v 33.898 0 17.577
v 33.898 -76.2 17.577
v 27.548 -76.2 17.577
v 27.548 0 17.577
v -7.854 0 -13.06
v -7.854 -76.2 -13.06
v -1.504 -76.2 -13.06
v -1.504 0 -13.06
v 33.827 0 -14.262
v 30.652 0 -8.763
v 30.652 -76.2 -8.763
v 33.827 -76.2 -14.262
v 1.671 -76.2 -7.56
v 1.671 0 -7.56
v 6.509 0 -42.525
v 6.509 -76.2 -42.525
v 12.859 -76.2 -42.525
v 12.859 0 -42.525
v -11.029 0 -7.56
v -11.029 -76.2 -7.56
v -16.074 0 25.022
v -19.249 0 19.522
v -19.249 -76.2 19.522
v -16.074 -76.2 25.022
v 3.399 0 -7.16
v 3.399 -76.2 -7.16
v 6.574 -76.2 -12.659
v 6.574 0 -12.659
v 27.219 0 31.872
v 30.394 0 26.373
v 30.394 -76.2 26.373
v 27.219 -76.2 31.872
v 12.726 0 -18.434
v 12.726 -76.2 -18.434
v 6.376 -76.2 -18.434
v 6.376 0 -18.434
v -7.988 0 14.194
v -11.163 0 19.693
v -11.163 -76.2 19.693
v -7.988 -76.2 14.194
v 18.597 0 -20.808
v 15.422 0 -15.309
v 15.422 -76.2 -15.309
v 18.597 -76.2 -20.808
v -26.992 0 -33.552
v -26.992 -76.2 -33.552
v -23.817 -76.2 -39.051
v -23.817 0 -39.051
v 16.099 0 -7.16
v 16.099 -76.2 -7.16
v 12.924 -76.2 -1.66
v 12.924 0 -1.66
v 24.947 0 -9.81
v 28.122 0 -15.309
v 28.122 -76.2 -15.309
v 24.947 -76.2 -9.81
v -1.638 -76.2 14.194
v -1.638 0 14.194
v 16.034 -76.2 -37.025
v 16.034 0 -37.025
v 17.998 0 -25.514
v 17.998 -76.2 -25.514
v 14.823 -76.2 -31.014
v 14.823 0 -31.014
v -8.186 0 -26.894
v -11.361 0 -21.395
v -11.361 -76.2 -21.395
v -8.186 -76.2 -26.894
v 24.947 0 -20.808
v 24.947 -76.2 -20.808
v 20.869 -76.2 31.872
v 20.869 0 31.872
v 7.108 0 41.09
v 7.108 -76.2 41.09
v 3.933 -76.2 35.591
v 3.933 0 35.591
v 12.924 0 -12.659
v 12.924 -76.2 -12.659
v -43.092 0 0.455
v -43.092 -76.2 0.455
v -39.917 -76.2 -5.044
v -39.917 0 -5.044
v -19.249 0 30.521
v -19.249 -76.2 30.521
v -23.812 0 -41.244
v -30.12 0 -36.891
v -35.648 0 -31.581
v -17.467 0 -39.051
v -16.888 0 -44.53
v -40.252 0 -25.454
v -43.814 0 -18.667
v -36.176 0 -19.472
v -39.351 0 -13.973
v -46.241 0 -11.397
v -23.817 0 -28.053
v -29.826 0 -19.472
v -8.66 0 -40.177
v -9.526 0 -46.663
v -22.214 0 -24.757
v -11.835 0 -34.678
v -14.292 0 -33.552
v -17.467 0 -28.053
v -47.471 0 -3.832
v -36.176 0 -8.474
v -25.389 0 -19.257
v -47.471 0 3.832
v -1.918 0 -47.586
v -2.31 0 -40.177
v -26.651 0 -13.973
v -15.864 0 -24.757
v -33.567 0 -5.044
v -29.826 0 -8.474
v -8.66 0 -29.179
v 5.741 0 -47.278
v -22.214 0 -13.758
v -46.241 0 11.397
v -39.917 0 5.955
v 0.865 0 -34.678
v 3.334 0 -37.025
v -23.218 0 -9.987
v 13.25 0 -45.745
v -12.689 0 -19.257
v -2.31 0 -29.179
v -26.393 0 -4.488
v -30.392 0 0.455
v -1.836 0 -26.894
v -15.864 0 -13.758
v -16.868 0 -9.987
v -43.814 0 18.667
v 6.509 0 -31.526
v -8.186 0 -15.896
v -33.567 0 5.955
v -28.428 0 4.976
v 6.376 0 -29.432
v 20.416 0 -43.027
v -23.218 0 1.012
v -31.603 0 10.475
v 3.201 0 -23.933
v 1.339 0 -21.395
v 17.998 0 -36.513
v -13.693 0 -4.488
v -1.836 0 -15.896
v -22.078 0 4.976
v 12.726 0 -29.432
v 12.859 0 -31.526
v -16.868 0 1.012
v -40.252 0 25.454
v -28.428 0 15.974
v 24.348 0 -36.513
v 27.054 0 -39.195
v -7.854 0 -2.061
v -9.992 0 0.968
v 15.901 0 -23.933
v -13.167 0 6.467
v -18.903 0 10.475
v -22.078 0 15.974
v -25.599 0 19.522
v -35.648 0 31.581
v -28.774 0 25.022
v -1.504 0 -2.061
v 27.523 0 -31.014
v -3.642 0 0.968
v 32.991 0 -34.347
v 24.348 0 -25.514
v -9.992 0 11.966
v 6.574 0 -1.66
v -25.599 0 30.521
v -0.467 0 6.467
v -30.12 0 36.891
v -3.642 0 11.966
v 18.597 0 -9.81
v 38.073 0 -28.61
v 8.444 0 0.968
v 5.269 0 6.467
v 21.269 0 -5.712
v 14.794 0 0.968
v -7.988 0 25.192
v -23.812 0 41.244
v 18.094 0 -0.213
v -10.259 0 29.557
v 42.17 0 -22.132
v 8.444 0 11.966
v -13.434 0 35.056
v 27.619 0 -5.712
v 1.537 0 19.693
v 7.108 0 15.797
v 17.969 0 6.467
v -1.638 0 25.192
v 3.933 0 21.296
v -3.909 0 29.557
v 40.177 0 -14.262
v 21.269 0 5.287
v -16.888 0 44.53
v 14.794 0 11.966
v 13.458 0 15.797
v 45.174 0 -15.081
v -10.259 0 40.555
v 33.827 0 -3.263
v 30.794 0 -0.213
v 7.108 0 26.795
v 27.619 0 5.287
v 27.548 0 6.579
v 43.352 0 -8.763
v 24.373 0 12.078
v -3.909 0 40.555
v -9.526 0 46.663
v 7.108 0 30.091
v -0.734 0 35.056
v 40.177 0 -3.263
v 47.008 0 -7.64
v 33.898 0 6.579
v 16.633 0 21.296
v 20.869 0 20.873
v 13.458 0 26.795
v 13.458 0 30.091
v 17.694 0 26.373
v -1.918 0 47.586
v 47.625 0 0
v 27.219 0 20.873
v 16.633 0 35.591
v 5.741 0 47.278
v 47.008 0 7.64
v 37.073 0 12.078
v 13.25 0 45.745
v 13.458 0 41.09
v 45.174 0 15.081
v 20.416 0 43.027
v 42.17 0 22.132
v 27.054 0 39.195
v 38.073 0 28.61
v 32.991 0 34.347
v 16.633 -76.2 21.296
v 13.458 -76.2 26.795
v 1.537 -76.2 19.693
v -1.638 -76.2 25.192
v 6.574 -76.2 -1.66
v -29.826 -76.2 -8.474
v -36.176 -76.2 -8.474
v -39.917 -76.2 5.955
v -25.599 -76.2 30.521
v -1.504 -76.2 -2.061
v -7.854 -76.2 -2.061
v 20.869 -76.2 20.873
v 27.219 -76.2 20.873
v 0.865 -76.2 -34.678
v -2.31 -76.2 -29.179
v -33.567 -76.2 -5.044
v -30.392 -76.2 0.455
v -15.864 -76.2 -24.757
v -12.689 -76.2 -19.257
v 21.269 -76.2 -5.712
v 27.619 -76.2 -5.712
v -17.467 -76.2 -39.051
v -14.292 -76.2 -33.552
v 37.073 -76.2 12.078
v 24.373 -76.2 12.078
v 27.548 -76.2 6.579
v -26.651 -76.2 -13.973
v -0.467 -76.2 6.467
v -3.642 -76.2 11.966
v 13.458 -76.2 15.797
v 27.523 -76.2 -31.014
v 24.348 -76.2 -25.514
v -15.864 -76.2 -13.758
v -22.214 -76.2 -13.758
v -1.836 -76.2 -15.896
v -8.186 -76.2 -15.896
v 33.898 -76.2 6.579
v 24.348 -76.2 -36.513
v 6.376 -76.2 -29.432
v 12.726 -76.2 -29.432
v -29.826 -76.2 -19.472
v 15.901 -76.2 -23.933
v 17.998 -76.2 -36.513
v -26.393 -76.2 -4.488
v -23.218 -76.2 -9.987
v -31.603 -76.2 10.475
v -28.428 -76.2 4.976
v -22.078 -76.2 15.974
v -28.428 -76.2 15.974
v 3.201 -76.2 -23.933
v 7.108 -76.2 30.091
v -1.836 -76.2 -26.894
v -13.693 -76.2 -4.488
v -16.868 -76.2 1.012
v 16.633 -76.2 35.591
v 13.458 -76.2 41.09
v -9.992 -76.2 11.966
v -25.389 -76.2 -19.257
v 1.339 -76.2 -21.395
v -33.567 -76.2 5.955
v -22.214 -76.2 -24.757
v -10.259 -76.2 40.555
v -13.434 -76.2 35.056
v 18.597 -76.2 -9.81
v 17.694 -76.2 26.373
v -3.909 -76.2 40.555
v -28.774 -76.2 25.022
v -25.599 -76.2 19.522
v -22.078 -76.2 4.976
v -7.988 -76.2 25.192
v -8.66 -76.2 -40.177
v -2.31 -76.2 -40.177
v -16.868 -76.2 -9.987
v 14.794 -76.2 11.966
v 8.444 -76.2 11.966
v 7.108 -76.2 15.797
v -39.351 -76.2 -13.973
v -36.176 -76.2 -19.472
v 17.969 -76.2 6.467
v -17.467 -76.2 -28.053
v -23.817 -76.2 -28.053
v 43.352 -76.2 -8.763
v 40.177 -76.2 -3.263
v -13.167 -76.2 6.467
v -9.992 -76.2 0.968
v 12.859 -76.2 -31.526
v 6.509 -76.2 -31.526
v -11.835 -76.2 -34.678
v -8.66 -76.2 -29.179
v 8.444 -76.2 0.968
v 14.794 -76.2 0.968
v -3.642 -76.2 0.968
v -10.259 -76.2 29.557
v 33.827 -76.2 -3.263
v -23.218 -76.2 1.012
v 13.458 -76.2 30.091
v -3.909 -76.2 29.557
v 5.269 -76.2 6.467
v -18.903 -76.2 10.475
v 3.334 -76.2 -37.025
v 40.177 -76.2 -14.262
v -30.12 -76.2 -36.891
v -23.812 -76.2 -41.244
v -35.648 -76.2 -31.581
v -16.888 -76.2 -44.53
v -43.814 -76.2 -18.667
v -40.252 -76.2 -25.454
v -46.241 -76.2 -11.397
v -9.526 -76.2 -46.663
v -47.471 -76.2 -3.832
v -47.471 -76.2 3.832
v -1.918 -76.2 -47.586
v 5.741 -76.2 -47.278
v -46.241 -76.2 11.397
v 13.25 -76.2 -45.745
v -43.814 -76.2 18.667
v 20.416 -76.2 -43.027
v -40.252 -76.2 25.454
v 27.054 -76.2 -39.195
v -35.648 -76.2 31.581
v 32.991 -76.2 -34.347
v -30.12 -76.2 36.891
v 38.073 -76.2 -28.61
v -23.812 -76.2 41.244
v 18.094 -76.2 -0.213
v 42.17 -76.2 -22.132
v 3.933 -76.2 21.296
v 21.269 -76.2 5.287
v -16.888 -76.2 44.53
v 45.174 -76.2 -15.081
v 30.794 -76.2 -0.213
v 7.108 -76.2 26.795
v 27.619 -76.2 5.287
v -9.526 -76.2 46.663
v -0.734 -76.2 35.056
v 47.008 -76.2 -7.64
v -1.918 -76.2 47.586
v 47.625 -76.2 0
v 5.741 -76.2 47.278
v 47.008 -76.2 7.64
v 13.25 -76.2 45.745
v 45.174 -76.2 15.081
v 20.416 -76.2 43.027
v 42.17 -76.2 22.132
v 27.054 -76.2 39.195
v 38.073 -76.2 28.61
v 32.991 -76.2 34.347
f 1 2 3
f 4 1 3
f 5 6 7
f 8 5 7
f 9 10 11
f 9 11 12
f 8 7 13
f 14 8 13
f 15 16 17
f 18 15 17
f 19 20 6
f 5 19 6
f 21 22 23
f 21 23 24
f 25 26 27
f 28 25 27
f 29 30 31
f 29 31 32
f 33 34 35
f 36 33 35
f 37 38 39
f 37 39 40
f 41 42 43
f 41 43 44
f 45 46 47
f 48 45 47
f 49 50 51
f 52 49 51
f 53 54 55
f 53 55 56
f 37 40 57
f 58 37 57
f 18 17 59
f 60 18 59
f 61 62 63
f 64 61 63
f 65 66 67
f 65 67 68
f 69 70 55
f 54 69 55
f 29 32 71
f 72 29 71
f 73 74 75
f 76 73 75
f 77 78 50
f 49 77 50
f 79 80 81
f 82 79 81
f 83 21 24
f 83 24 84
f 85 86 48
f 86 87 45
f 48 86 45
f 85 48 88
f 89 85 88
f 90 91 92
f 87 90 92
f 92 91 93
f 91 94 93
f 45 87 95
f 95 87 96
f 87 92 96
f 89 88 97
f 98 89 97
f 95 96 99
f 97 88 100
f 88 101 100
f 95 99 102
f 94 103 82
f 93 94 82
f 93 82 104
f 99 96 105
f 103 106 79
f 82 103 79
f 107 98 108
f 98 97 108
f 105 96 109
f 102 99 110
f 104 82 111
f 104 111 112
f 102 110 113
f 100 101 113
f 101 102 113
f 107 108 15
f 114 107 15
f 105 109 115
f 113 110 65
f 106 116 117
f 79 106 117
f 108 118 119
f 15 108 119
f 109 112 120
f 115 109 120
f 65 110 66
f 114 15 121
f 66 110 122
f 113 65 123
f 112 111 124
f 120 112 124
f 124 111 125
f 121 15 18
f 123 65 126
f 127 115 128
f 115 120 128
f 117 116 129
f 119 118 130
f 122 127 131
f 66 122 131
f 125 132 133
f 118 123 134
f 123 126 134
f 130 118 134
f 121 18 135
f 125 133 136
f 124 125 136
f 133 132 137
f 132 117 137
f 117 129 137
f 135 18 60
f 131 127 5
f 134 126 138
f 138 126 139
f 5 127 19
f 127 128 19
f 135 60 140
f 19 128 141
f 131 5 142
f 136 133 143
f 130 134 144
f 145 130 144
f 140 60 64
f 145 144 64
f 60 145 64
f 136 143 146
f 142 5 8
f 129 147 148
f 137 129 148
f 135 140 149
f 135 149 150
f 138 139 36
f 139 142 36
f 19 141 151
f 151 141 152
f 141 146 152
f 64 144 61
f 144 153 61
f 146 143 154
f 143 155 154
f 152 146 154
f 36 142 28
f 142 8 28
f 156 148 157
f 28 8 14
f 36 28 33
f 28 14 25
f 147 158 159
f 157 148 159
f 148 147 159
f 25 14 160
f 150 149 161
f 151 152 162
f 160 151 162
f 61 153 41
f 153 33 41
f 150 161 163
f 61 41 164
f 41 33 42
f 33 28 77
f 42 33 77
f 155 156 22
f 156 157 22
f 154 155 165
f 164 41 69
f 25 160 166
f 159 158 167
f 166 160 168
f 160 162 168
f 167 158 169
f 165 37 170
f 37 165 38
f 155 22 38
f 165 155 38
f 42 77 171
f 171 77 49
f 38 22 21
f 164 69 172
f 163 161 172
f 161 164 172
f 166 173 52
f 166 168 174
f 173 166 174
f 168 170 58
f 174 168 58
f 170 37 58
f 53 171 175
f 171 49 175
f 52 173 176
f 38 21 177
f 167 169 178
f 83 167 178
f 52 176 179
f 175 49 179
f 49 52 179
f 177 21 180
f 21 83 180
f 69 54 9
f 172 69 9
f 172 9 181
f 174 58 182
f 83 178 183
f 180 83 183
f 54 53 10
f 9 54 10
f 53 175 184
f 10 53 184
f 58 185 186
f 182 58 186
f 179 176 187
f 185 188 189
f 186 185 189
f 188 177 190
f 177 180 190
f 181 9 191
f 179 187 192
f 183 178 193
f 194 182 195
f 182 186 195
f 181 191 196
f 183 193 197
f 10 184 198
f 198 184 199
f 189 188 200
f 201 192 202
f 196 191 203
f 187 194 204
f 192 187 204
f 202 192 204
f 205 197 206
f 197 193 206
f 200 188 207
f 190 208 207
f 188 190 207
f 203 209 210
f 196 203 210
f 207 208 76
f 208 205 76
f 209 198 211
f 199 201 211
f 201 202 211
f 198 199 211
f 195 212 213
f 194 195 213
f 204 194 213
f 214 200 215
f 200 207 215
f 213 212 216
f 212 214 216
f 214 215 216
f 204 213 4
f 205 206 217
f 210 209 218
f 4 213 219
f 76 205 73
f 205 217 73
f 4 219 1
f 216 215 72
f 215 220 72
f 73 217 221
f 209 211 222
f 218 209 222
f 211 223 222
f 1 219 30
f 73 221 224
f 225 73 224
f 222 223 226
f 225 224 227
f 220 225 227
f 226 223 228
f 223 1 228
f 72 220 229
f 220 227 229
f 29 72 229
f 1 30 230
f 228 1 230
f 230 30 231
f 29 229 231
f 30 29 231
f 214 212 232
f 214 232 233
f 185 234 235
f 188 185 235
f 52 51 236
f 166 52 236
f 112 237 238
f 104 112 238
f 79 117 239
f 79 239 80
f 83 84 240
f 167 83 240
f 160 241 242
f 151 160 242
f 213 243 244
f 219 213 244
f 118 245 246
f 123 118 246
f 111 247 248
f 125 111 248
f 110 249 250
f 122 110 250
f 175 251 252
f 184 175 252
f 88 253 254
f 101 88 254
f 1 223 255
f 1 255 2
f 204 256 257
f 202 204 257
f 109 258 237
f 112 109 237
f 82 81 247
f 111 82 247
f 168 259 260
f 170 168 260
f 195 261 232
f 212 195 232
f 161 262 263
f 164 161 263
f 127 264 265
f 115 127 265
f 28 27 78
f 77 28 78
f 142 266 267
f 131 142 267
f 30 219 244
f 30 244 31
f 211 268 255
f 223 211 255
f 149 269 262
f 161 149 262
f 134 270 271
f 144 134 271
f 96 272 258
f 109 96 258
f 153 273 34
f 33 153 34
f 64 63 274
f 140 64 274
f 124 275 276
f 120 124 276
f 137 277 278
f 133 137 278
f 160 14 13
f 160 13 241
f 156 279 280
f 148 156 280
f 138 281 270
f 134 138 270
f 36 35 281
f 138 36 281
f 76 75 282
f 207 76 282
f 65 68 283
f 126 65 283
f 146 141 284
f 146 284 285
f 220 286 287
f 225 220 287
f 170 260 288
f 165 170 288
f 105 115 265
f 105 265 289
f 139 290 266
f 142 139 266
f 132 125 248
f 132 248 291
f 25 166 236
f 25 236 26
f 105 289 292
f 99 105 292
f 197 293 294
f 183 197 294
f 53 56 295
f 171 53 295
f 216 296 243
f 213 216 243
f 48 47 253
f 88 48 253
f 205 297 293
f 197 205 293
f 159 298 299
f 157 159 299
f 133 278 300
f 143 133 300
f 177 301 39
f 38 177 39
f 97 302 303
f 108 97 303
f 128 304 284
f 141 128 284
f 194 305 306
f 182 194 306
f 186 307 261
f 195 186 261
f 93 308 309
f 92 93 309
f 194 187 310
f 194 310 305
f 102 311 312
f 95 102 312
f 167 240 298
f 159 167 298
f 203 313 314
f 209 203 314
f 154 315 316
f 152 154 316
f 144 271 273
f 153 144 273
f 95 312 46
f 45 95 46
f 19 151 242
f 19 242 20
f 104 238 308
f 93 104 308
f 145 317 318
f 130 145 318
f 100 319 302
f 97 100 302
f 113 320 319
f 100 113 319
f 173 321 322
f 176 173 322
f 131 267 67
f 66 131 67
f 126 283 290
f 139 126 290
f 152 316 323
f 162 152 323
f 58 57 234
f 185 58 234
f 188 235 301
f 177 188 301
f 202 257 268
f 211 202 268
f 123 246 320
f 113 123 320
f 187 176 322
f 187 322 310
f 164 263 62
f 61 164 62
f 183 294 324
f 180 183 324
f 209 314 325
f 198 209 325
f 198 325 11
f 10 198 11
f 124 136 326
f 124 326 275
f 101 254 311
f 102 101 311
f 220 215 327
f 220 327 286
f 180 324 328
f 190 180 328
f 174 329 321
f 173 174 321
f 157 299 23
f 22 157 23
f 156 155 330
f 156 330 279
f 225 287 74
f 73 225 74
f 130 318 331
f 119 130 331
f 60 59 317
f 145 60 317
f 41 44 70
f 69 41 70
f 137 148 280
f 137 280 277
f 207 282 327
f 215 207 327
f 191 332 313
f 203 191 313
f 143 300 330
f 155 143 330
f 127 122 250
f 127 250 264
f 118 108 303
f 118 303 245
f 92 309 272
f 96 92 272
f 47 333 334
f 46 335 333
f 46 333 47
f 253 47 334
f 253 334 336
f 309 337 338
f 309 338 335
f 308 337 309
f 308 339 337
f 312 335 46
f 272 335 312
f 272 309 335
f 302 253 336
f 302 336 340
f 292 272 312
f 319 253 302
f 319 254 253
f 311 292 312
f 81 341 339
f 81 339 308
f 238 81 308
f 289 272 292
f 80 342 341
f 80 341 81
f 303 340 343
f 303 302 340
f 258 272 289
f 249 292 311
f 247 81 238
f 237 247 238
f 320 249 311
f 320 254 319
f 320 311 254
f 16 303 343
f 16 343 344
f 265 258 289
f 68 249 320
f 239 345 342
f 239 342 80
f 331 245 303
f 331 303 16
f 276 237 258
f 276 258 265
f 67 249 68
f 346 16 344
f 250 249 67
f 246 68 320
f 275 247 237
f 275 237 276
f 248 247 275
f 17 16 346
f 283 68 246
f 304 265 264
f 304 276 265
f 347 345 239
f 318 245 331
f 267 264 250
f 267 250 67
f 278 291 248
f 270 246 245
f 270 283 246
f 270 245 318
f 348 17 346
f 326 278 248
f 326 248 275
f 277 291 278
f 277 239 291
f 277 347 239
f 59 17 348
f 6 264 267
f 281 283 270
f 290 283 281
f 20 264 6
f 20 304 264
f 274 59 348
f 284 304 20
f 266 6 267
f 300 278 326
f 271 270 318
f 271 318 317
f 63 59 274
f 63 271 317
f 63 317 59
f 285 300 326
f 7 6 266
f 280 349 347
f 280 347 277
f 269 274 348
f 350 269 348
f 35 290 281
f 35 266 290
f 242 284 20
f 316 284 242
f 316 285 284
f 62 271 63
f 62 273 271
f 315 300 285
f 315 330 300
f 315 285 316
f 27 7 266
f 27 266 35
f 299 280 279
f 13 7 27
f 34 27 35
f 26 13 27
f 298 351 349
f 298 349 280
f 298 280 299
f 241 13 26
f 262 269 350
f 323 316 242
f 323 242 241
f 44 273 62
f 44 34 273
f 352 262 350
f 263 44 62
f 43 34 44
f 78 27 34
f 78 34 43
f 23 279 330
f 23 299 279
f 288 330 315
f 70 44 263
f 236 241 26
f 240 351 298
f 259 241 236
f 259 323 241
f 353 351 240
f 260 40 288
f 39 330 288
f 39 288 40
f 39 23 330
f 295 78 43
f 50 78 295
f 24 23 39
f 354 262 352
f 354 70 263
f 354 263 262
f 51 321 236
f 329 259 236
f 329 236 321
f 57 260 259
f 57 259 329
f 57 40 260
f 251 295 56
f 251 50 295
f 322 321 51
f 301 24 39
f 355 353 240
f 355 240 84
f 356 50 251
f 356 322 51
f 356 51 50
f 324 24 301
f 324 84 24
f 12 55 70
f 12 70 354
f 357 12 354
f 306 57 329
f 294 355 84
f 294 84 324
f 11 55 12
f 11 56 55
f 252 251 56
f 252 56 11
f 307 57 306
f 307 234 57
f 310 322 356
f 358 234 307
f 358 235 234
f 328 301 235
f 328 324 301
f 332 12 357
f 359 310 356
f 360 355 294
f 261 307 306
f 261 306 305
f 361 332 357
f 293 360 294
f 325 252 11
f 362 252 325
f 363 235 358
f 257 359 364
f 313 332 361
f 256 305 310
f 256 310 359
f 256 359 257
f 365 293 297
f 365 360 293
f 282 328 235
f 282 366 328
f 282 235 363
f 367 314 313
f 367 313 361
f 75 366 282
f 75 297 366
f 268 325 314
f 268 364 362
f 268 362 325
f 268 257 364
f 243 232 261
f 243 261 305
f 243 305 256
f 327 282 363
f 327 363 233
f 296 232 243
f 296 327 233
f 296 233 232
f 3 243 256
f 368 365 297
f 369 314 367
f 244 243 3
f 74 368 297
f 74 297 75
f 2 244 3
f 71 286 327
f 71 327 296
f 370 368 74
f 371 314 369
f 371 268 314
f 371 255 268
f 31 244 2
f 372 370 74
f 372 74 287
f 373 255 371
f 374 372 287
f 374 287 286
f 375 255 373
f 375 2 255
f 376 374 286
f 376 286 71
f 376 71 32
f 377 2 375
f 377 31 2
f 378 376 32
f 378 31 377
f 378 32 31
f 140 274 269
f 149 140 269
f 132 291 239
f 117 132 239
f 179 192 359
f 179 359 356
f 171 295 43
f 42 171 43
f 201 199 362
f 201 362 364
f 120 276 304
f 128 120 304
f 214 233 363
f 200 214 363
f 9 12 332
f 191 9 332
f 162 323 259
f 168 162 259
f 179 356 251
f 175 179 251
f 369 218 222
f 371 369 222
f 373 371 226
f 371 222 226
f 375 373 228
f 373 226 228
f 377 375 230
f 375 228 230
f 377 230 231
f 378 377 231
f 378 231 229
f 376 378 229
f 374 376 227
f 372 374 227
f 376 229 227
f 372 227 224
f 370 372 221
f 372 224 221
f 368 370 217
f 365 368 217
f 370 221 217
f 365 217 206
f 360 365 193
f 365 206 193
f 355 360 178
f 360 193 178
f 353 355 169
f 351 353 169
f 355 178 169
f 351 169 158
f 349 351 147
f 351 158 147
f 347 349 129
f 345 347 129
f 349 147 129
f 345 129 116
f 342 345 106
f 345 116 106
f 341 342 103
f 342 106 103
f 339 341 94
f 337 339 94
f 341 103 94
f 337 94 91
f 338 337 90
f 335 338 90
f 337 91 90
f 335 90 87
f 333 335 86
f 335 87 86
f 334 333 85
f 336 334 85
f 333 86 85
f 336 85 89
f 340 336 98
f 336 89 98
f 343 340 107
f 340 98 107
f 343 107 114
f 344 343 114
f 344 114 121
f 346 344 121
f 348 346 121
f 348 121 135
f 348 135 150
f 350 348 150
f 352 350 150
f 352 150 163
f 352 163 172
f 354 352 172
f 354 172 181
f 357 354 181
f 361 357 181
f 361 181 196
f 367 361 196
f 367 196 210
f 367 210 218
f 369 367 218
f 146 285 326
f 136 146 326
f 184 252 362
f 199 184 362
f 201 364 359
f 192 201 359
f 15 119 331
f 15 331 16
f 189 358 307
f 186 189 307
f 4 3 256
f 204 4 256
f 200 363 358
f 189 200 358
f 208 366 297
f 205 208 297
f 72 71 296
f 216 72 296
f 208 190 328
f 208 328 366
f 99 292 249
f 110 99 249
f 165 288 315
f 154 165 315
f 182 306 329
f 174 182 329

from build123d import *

# Parameters (mm, degrees)
F0_R     = 47.625
F1_DEPTH = 76.2
F3_DEPTH = 76.201


with BuildPart() as f1:
    # F0 (on Front) → F1 (new body)
    with BuildSketch(Plane.XZ):
        Circle(F0_R)
    extrude(amount=F1_DEPTH)

    # F2 (on face) → F3 (cut, through all)
    with BuildSketch(Plane.XZ.offset(76.2)):
        Polygon((-16.073533, 25.021508), (-19.248533, 30.52077), (-25.598533, 30.52077), (-28.773533, 25.021508), (-25.598533, 19.522247), (-19.248533, 19.522247), align=None)
        Polygon((-0.733869, 35.056195), (-3.908869, 40.555456), (-10.258869, 40.555456), (-13.433869, 35.056195), (-10.258869, 29.556934), (-3.908869, 29.556934), align=None)
        Polygon((16.633373, 35.590573), (13.458373, 41.089834), (7.108373, 41.089834), (3.933373, 35.590573), (7.108373, 30.091312), (13.458373, 30.091312), align=None)
        Polygon((1.537231, 19.692863), (-1.637769, 25.192124), (-7.987769, 25.192124), (-11.162769, 19.692863), (-7.987769, 14.193602), (-1.637769, 14.193602), align=None)
        Polygon((16.633373, 21.295993), (13.458373, 26.795255), (7.108373, 26.795255), (3.933373, 21.295993), (7.108373, 15.796732), (13.458373, 15.796732), align=None)
        Polygon((30.393575, 26.372573), (27.218575, 31.871834), (20.868575, 31.871834), (17.693575, 26.372573), (20.868575, 20.873312), (27.218575, 20.873312), align=None)
        Polygon((37.073285, 12.077994), (33.898285, 17.577256), (27.548285, 17.577256), (24.373285, 12.077994), (27.548285, 6.578733), (33.898285, 6.578733), align=None)
        Polygon((17.969316, 6.467039), (14.794316, 11.9663), (8.444316, 11.9663), (5.269316, 6.467039), (8.444316, 0.967778), (14.794316, 0.967778), align=None)
        Polygon((-0.466681, 6.467039), (-3.641681, 11.9663), (-9.991681, 11.9663), (-13.166681, 6.467039), (-9.991681, 0.967778), (-3.641681, 0.967778), align=None)
        Polygon((-18.902677, 10.474864), (-22.077677, 15.974126), (-28.427677, 15.974126), (-31.602677, 10.474864), (-28.427677, 4.975603), (-22.077677, 4.975603), align=None)
        Polygon((-30.391778, 0.455301), (-33.566778, 5.954563), (-39.916778, 5.954563), (-43.091778, 0.455301), (-39.916778, -5.04396), (-33.566778, -5.04396), align=None)
        Polygon((-26.65114, -13.972871), (-29.82614, -8.47361), (-36.17614, -8.47361), (-39.35114, -13.972871), (-36.17614, -19.472132), (-29.82614, -19.472132), align=None)
        Polygon((-13.692505, -4.487684), (-16.867505, 1.011578), (-23.217505, 1.011578), (-26.392505, -4.487684), (-23.217505, -9.986945), (-16.867505, -9.986945), align=None)
        Polygon((1.670825, -7.56035), (-1.504175, -2.061088), (-7.854175, -2.061088), (-11.029175, -7.56035), (-7.854175, -13.059611), (-1.504175, -13.059611), align=None)
        Polygon((16.098997, -7.159568), (12.923997, -1.660306), (6.573997, -1.660306), (3.398997, -7.159568), (6.573997, -12.658829), (12.923997, -12.658829), align=None)
        Polygon((30.794357, -0.21267), (27.619357, 5.286592), (21.269357, 5.286592), (18.094357, -0.21267), (21.269357, -5.711931), (27.619357, -5.711931), align=None)
        Polygon((43.35221, -8.762698), (40.17721, -3.263437), (33.82721, -3.263437), (30.65221, -8.762698), (33.82721, -14.261959), (40.17721, -14.261959), align=None)
        Polygon((28.122474, -15.308812), (24.947474, -9.809551), (18.597474, -9.809551), (15.422474, -15.308812), (18.597474, -20.808074), (24.947474, -20.808074), align=None)
        Polygon((-12.688582, -19.25737), (-15.863582, -13.758108), (-22.213582, -13.758108), (-25.388582, -19.25737), (-22.213582, -24.756631), (-15.863582, -24.756631), align=None)
        Polygon((1.338806, -21.394878), (-1.836194, -15.895617), (-8.186194, -15.895617), (-11.361194, -21.394878), (-8.186194, -26.894139), (-1.836194, -26.894139), align=None)
        Polygon((15.900572, -23.933166), (12.725572, -18.433905), (6.375572, -18.433905), (3.200572, -23.933166), (6.375572, -29.432427), (12.725572, -29.432427), align=None)
        Polygon((0.865366, -34.677781), (-2.309634, -29.17852), (-8.659634, -29.17852), (-11.834634, -34.677781), (-8.659634, -40.177042), (-2.309634, -40.177042), align=None)
        Polygon((-14.291712, -33.551947), (-17.466712, -28.052686), (-23.816712, -28.052686), (-26.991712, -33.551947), (-23.816712, -39.051209), (-17.466712, -39.051209), align=None)
        Polygon((27.523267, -31.013658), (24.348267, -25.514396), (17.998267, -25.514396), (14.823267, -31.013658), (17.998267, -36.512919), (24.348267, -36.512919), align=None)
        Polygon((16.034166, -37.025397), (12.859166, -31.526136), (6.509166, -31.526136), (3.334166, -37.025397), (6.509166, -42.524658), (12.859166, -42.524658), align=None)
    extrude(amount=-F3_DEPTH, mode=Mode.SUBTRACT)


solid = f1.part
